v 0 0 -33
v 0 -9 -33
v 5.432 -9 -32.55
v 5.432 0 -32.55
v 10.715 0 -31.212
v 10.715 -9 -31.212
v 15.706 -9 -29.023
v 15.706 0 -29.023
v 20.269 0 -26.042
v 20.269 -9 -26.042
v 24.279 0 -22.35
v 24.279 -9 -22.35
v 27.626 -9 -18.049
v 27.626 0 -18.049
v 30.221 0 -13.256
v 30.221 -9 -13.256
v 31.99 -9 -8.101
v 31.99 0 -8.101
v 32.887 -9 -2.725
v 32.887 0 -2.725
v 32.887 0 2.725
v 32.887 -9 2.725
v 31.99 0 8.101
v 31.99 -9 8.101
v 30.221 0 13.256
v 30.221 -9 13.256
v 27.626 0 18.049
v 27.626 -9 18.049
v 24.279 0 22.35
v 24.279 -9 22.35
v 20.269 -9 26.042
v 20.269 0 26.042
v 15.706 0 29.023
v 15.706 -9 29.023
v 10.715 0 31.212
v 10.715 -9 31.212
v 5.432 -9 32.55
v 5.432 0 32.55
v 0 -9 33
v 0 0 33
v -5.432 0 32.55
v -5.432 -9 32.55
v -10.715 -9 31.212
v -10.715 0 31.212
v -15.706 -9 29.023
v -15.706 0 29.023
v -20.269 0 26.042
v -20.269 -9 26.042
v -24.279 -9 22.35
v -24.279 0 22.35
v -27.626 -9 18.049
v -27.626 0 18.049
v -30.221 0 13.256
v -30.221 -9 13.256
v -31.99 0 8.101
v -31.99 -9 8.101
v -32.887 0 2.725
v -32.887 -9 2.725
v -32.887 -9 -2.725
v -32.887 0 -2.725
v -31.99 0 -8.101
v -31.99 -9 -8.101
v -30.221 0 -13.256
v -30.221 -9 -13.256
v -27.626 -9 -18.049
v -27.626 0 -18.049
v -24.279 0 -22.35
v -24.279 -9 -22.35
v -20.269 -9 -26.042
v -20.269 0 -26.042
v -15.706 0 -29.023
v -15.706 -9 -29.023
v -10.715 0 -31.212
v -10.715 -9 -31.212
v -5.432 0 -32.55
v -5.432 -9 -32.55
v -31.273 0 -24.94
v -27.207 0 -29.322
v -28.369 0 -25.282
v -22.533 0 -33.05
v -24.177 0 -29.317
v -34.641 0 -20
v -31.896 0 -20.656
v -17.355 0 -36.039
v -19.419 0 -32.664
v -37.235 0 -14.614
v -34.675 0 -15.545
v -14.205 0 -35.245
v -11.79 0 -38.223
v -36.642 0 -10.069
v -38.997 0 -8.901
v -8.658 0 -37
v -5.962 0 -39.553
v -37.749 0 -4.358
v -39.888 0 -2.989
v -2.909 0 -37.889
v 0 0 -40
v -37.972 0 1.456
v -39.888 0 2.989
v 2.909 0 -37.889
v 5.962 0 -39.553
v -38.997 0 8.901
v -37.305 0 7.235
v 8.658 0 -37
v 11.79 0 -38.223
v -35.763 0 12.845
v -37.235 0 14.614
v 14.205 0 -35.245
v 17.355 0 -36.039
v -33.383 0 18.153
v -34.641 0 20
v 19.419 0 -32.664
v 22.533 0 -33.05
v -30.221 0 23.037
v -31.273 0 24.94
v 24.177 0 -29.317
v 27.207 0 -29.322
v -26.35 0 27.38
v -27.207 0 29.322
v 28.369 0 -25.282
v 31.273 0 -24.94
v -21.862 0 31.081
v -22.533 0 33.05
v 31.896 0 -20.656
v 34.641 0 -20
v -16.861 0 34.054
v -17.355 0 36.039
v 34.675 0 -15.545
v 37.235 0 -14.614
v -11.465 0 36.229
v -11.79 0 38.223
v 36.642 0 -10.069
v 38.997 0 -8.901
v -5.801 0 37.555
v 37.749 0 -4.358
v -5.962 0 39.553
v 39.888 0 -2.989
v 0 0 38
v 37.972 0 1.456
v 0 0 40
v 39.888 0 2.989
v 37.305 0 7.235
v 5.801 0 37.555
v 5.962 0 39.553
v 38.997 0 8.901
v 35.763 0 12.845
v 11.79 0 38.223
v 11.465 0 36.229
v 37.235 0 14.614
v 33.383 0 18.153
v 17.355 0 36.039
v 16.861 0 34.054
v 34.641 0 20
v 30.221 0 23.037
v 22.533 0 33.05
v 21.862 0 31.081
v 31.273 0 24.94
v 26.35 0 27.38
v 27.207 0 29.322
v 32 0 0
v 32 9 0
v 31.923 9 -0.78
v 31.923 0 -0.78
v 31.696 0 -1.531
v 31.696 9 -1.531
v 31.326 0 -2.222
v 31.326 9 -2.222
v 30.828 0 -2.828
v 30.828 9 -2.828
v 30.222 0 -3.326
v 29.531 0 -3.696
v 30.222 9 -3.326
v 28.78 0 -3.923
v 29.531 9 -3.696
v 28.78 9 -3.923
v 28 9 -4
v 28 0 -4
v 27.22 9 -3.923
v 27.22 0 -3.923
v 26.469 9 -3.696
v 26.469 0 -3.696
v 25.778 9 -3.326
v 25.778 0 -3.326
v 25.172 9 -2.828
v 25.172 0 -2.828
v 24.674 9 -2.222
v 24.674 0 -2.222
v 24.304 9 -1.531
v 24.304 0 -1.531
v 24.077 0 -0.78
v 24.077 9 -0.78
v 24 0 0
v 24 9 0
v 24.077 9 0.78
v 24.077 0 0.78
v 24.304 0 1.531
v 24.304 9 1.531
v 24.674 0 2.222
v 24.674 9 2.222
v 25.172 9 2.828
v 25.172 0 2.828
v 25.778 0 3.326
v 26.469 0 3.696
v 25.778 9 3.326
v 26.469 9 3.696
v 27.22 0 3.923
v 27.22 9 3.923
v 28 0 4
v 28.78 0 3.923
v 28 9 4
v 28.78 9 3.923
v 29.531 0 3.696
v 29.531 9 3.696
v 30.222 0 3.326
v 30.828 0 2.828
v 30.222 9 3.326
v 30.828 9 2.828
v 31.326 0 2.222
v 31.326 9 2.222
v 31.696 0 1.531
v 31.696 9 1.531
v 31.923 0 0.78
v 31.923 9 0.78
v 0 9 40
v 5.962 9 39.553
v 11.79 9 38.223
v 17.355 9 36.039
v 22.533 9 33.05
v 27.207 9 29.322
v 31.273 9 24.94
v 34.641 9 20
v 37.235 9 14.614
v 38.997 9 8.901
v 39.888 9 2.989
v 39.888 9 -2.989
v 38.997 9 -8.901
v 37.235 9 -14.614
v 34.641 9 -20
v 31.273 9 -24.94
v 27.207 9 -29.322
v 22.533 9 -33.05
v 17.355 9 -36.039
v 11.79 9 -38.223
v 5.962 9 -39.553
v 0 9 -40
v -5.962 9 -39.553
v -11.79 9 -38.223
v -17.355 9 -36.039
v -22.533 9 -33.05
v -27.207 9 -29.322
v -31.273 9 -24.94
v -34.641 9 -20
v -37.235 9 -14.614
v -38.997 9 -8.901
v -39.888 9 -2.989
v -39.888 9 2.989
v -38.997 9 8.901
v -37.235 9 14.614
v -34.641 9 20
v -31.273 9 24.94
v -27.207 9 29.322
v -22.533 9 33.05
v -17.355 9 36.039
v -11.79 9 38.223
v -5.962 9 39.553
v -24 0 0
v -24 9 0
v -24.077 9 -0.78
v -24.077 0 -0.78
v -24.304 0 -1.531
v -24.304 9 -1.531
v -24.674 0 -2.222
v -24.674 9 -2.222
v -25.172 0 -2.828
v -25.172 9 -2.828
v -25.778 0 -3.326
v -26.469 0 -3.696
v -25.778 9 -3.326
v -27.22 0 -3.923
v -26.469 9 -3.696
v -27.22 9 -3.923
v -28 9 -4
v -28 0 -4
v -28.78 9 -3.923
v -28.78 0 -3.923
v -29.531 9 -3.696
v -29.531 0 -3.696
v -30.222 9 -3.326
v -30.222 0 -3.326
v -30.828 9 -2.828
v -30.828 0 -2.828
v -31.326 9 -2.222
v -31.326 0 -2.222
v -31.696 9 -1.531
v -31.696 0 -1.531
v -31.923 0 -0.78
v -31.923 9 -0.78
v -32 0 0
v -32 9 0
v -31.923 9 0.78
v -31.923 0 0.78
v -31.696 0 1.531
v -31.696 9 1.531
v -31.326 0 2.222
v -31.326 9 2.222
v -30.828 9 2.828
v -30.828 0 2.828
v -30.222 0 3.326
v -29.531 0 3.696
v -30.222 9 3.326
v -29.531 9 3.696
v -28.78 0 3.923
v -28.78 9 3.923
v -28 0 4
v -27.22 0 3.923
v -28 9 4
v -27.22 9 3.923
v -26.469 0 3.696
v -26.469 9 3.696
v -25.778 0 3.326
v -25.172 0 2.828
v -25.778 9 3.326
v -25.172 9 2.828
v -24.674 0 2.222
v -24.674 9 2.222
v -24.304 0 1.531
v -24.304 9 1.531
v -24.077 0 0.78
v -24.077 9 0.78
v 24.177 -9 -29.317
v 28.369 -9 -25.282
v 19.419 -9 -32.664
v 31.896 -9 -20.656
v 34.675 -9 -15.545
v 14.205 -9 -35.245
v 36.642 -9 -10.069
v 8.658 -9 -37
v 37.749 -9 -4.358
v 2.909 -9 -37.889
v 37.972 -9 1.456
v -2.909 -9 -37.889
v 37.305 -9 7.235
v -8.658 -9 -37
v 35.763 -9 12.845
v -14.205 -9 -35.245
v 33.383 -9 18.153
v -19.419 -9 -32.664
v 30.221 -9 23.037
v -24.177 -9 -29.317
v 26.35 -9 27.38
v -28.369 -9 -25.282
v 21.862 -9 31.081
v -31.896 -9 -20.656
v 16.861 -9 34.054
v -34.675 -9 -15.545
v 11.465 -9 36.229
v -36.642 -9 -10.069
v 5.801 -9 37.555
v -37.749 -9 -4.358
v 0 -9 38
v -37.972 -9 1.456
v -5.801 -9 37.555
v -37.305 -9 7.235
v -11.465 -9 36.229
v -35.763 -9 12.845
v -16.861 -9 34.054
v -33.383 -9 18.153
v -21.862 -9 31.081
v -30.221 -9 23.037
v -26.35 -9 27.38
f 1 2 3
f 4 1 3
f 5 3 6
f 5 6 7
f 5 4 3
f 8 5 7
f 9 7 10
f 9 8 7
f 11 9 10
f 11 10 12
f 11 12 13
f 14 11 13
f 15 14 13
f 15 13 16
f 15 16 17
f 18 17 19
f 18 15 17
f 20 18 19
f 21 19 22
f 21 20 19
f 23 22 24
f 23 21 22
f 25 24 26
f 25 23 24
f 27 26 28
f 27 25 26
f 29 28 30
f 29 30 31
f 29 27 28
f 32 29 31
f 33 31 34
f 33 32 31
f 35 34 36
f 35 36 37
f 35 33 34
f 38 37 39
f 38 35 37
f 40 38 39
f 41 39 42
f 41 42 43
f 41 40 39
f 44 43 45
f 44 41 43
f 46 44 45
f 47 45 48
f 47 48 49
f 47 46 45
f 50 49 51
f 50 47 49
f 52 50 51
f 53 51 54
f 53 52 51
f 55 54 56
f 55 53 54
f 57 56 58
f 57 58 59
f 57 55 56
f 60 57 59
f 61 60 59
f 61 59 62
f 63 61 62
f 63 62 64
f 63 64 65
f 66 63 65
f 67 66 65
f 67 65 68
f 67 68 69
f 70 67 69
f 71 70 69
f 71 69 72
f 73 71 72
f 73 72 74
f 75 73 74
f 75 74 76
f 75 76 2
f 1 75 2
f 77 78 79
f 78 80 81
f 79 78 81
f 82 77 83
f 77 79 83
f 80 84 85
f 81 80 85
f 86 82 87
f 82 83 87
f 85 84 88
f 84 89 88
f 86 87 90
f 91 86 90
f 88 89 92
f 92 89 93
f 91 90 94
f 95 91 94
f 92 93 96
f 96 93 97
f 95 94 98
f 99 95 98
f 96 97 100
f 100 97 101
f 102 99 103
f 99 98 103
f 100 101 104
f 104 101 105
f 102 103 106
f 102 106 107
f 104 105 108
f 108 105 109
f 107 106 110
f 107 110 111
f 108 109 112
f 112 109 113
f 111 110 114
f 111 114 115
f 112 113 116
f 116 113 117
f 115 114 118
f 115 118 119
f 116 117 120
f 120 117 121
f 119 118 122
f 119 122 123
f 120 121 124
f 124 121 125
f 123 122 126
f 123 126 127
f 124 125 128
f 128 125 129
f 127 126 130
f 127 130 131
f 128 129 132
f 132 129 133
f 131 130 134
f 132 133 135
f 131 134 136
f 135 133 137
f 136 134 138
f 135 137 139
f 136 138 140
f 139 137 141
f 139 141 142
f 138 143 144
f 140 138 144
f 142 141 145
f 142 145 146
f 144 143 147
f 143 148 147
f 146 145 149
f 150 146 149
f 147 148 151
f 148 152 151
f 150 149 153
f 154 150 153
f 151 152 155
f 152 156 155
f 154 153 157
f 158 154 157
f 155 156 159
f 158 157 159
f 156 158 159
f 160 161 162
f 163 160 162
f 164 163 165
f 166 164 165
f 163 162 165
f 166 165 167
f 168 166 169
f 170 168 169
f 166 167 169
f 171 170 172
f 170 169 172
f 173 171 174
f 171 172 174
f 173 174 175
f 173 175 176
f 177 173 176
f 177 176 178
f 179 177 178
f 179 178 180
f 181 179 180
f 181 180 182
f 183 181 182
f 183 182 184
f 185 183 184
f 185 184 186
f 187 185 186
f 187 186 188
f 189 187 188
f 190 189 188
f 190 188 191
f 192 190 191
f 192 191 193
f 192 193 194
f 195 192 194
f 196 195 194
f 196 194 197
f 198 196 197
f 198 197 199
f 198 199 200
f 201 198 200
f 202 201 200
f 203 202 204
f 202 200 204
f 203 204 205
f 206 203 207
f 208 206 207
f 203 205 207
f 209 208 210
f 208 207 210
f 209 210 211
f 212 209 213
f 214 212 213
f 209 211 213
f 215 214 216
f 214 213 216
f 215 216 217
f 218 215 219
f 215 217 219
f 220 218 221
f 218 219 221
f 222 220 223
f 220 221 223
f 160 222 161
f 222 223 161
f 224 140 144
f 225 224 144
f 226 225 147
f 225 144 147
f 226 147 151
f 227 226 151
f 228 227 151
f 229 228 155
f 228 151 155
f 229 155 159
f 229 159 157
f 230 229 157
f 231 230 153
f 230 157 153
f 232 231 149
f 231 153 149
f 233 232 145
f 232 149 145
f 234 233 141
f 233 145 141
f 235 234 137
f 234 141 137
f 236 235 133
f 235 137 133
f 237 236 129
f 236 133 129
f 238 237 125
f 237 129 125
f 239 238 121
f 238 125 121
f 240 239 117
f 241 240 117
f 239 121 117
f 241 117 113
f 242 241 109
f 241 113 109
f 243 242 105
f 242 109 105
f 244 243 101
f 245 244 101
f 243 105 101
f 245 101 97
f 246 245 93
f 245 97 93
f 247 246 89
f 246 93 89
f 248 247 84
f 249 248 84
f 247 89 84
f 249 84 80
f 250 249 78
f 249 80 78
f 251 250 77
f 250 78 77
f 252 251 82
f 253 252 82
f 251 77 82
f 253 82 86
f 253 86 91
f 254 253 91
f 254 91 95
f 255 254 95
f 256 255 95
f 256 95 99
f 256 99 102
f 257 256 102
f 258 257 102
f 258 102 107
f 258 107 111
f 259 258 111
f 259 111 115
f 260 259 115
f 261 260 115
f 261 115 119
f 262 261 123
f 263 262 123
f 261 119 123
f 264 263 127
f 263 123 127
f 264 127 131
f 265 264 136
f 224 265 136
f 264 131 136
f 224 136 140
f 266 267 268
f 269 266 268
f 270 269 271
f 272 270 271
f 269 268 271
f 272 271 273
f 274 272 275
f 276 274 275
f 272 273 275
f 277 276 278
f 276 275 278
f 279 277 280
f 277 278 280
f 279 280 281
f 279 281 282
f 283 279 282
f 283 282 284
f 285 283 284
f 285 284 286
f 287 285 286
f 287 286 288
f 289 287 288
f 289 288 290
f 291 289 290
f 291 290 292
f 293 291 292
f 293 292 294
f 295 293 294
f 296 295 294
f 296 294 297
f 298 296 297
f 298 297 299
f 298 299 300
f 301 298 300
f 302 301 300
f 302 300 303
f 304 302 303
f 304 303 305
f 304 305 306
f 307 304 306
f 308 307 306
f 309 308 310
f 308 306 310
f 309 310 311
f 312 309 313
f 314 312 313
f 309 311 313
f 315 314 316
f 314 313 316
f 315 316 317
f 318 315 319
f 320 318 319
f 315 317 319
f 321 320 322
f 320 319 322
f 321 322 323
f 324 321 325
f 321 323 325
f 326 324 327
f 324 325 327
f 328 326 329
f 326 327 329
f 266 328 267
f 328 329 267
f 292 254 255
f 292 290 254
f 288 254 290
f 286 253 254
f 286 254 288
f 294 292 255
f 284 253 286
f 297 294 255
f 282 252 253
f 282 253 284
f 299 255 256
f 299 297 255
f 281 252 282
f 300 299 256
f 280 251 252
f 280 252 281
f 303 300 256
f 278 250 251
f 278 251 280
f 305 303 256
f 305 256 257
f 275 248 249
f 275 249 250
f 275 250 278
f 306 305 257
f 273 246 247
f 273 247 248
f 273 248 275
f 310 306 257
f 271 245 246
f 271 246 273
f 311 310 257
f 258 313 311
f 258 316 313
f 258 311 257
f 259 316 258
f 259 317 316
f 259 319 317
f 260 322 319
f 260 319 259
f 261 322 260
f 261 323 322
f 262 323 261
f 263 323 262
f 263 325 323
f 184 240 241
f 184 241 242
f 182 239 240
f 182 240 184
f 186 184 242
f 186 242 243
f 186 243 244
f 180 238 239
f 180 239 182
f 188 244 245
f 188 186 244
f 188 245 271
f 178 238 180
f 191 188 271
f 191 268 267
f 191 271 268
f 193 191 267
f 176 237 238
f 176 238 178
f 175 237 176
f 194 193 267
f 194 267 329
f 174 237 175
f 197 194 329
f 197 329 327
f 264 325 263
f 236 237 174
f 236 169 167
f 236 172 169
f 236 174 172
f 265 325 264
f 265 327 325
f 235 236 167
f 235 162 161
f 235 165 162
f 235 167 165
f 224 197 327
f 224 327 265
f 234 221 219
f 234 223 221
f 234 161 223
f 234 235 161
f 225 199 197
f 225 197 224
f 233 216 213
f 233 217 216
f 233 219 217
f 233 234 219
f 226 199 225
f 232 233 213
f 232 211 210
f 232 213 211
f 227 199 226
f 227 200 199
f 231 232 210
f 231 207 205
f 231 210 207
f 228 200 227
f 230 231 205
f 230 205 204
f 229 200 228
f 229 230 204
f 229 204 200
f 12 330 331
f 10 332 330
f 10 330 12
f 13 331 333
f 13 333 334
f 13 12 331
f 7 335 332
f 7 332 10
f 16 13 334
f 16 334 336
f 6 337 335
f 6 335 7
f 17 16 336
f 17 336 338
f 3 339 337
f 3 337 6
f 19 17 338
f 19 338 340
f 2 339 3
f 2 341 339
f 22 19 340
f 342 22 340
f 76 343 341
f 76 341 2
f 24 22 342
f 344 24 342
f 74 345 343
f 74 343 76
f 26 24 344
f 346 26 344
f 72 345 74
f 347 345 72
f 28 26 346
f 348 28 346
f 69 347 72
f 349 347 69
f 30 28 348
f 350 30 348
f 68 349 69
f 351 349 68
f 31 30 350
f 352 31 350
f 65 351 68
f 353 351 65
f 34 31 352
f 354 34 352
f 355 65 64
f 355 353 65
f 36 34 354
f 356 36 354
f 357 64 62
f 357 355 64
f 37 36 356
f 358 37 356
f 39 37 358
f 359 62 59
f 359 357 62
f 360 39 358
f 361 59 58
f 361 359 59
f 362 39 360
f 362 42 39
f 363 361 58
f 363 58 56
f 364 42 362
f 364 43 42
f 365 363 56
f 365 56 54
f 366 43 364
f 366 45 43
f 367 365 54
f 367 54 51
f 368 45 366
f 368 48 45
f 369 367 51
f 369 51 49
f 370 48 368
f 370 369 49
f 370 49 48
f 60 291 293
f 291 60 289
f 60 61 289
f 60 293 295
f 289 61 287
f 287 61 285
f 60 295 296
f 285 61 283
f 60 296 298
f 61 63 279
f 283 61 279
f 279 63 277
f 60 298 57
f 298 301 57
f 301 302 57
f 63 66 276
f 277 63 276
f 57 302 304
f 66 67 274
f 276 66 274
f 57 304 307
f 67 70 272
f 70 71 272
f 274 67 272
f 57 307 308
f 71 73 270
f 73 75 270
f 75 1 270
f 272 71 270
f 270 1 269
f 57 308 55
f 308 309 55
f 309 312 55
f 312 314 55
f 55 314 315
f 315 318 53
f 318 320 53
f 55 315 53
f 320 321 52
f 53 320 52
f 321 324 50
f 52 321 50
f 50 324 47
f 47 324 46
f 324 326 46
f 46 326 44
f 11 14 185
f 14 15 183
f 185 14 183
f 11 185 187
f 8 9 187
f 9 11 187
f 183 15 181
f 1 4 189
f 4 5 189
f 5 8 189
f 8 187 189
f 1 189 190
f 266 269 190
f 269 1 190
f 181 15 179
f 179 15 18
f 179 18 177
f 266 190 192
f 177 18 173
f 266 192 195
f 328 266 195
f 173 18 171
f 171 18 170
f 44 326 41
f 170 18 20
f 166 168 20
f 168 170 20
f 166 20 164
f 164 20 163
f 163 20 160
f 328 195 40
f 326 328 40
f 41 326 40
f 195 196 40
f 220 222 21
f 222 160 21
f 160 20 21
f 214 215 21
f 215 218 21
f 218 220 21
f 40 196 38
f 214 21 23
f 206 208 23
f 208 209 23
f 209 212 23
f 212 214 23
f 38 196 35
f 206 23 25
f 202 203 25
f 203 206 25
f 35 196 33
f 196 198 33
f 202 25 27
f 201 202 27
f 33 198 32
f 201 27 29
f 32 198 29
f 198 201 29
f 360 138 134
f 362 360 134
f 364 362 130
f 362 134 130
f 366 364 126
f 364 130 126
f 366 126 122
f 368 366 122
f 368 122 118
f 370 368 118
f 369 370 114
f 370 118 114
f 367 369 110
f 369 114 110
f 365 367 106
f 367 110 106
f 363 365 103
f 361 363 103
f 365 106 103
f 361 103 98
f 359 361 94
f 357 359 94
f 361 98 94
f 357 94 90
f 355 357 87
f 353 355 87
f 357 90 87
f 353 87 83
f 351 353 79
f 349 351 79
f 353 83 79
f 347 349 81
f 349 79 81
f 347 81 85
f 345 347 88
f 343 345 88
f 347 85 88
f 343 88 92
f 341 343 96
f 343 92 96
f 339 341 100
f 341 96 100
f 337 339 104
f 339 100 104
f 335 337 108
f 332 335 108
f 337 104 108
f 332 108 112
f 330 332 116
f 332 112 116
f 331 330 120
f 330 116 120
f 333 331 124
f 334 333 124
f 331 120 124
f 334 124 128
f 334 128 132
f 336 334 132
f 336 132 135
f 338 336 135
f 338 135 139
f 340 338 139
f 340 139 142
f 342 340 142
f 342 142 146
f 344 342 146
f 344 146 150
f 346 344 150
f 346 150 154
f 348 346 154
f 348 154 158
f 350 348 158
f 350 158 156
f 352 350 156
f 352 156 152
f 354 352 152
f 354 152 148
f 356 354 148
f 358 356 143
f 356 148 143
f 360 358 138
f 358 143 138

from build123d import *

# Parameters (mm, degrees)
SKETCH1_R             = 40
BOSS_EXTRUDE1_DEPTH   = 9
SKETCH2_R             = 38
SKETCH2_R_2           = 33
BOSS_EXTRUDE2_DEPTH   = 9
F_8_0MM_DOWEL_HOLE1_D = 8


with BuildPart() as part:
    # Sketch1 → Boss-Extrude1 (new body)
    with BuildSketch(Plane(origin=(0, 0, 0), x_dir=(1, 0, 0), z_dir=(0, 1, 0))):
        with Locations(Location((0, 0, 0), (0, 0, 270))):
            Circle(SKETCH1_R)
    extrude(amount=BOSS_EXTRUDE1_DEPTH)

    # Sketch2 → Boss-Extrude2 (add)
    with BuildSketch(Plane.XZ):
        with Locations(Location((0, 0, 0), (0, 0, 90))):
            Circle(SKETCH2_R)
        with Locations(Location((0, 0, 0), (0, 0, 270))):
            Circle(SKETCH2_R_2, mode=Mode.SUBTRACT)
    extrude(amount=BOSS_EXTRUDE2_DEPTH)

    # Ø8.0mm Dowel Hole1 (through all)
    with Locations(Plane(origin=(0, 0, 0), x_dir=(-1, 0, 0), z_dir=(0, -1, 0))):
        with Locations((-28, 0), (28, 0)):
            Hole(F_8_0MM_DOWEL_HOLE1_D / 2)


solid = part.part
